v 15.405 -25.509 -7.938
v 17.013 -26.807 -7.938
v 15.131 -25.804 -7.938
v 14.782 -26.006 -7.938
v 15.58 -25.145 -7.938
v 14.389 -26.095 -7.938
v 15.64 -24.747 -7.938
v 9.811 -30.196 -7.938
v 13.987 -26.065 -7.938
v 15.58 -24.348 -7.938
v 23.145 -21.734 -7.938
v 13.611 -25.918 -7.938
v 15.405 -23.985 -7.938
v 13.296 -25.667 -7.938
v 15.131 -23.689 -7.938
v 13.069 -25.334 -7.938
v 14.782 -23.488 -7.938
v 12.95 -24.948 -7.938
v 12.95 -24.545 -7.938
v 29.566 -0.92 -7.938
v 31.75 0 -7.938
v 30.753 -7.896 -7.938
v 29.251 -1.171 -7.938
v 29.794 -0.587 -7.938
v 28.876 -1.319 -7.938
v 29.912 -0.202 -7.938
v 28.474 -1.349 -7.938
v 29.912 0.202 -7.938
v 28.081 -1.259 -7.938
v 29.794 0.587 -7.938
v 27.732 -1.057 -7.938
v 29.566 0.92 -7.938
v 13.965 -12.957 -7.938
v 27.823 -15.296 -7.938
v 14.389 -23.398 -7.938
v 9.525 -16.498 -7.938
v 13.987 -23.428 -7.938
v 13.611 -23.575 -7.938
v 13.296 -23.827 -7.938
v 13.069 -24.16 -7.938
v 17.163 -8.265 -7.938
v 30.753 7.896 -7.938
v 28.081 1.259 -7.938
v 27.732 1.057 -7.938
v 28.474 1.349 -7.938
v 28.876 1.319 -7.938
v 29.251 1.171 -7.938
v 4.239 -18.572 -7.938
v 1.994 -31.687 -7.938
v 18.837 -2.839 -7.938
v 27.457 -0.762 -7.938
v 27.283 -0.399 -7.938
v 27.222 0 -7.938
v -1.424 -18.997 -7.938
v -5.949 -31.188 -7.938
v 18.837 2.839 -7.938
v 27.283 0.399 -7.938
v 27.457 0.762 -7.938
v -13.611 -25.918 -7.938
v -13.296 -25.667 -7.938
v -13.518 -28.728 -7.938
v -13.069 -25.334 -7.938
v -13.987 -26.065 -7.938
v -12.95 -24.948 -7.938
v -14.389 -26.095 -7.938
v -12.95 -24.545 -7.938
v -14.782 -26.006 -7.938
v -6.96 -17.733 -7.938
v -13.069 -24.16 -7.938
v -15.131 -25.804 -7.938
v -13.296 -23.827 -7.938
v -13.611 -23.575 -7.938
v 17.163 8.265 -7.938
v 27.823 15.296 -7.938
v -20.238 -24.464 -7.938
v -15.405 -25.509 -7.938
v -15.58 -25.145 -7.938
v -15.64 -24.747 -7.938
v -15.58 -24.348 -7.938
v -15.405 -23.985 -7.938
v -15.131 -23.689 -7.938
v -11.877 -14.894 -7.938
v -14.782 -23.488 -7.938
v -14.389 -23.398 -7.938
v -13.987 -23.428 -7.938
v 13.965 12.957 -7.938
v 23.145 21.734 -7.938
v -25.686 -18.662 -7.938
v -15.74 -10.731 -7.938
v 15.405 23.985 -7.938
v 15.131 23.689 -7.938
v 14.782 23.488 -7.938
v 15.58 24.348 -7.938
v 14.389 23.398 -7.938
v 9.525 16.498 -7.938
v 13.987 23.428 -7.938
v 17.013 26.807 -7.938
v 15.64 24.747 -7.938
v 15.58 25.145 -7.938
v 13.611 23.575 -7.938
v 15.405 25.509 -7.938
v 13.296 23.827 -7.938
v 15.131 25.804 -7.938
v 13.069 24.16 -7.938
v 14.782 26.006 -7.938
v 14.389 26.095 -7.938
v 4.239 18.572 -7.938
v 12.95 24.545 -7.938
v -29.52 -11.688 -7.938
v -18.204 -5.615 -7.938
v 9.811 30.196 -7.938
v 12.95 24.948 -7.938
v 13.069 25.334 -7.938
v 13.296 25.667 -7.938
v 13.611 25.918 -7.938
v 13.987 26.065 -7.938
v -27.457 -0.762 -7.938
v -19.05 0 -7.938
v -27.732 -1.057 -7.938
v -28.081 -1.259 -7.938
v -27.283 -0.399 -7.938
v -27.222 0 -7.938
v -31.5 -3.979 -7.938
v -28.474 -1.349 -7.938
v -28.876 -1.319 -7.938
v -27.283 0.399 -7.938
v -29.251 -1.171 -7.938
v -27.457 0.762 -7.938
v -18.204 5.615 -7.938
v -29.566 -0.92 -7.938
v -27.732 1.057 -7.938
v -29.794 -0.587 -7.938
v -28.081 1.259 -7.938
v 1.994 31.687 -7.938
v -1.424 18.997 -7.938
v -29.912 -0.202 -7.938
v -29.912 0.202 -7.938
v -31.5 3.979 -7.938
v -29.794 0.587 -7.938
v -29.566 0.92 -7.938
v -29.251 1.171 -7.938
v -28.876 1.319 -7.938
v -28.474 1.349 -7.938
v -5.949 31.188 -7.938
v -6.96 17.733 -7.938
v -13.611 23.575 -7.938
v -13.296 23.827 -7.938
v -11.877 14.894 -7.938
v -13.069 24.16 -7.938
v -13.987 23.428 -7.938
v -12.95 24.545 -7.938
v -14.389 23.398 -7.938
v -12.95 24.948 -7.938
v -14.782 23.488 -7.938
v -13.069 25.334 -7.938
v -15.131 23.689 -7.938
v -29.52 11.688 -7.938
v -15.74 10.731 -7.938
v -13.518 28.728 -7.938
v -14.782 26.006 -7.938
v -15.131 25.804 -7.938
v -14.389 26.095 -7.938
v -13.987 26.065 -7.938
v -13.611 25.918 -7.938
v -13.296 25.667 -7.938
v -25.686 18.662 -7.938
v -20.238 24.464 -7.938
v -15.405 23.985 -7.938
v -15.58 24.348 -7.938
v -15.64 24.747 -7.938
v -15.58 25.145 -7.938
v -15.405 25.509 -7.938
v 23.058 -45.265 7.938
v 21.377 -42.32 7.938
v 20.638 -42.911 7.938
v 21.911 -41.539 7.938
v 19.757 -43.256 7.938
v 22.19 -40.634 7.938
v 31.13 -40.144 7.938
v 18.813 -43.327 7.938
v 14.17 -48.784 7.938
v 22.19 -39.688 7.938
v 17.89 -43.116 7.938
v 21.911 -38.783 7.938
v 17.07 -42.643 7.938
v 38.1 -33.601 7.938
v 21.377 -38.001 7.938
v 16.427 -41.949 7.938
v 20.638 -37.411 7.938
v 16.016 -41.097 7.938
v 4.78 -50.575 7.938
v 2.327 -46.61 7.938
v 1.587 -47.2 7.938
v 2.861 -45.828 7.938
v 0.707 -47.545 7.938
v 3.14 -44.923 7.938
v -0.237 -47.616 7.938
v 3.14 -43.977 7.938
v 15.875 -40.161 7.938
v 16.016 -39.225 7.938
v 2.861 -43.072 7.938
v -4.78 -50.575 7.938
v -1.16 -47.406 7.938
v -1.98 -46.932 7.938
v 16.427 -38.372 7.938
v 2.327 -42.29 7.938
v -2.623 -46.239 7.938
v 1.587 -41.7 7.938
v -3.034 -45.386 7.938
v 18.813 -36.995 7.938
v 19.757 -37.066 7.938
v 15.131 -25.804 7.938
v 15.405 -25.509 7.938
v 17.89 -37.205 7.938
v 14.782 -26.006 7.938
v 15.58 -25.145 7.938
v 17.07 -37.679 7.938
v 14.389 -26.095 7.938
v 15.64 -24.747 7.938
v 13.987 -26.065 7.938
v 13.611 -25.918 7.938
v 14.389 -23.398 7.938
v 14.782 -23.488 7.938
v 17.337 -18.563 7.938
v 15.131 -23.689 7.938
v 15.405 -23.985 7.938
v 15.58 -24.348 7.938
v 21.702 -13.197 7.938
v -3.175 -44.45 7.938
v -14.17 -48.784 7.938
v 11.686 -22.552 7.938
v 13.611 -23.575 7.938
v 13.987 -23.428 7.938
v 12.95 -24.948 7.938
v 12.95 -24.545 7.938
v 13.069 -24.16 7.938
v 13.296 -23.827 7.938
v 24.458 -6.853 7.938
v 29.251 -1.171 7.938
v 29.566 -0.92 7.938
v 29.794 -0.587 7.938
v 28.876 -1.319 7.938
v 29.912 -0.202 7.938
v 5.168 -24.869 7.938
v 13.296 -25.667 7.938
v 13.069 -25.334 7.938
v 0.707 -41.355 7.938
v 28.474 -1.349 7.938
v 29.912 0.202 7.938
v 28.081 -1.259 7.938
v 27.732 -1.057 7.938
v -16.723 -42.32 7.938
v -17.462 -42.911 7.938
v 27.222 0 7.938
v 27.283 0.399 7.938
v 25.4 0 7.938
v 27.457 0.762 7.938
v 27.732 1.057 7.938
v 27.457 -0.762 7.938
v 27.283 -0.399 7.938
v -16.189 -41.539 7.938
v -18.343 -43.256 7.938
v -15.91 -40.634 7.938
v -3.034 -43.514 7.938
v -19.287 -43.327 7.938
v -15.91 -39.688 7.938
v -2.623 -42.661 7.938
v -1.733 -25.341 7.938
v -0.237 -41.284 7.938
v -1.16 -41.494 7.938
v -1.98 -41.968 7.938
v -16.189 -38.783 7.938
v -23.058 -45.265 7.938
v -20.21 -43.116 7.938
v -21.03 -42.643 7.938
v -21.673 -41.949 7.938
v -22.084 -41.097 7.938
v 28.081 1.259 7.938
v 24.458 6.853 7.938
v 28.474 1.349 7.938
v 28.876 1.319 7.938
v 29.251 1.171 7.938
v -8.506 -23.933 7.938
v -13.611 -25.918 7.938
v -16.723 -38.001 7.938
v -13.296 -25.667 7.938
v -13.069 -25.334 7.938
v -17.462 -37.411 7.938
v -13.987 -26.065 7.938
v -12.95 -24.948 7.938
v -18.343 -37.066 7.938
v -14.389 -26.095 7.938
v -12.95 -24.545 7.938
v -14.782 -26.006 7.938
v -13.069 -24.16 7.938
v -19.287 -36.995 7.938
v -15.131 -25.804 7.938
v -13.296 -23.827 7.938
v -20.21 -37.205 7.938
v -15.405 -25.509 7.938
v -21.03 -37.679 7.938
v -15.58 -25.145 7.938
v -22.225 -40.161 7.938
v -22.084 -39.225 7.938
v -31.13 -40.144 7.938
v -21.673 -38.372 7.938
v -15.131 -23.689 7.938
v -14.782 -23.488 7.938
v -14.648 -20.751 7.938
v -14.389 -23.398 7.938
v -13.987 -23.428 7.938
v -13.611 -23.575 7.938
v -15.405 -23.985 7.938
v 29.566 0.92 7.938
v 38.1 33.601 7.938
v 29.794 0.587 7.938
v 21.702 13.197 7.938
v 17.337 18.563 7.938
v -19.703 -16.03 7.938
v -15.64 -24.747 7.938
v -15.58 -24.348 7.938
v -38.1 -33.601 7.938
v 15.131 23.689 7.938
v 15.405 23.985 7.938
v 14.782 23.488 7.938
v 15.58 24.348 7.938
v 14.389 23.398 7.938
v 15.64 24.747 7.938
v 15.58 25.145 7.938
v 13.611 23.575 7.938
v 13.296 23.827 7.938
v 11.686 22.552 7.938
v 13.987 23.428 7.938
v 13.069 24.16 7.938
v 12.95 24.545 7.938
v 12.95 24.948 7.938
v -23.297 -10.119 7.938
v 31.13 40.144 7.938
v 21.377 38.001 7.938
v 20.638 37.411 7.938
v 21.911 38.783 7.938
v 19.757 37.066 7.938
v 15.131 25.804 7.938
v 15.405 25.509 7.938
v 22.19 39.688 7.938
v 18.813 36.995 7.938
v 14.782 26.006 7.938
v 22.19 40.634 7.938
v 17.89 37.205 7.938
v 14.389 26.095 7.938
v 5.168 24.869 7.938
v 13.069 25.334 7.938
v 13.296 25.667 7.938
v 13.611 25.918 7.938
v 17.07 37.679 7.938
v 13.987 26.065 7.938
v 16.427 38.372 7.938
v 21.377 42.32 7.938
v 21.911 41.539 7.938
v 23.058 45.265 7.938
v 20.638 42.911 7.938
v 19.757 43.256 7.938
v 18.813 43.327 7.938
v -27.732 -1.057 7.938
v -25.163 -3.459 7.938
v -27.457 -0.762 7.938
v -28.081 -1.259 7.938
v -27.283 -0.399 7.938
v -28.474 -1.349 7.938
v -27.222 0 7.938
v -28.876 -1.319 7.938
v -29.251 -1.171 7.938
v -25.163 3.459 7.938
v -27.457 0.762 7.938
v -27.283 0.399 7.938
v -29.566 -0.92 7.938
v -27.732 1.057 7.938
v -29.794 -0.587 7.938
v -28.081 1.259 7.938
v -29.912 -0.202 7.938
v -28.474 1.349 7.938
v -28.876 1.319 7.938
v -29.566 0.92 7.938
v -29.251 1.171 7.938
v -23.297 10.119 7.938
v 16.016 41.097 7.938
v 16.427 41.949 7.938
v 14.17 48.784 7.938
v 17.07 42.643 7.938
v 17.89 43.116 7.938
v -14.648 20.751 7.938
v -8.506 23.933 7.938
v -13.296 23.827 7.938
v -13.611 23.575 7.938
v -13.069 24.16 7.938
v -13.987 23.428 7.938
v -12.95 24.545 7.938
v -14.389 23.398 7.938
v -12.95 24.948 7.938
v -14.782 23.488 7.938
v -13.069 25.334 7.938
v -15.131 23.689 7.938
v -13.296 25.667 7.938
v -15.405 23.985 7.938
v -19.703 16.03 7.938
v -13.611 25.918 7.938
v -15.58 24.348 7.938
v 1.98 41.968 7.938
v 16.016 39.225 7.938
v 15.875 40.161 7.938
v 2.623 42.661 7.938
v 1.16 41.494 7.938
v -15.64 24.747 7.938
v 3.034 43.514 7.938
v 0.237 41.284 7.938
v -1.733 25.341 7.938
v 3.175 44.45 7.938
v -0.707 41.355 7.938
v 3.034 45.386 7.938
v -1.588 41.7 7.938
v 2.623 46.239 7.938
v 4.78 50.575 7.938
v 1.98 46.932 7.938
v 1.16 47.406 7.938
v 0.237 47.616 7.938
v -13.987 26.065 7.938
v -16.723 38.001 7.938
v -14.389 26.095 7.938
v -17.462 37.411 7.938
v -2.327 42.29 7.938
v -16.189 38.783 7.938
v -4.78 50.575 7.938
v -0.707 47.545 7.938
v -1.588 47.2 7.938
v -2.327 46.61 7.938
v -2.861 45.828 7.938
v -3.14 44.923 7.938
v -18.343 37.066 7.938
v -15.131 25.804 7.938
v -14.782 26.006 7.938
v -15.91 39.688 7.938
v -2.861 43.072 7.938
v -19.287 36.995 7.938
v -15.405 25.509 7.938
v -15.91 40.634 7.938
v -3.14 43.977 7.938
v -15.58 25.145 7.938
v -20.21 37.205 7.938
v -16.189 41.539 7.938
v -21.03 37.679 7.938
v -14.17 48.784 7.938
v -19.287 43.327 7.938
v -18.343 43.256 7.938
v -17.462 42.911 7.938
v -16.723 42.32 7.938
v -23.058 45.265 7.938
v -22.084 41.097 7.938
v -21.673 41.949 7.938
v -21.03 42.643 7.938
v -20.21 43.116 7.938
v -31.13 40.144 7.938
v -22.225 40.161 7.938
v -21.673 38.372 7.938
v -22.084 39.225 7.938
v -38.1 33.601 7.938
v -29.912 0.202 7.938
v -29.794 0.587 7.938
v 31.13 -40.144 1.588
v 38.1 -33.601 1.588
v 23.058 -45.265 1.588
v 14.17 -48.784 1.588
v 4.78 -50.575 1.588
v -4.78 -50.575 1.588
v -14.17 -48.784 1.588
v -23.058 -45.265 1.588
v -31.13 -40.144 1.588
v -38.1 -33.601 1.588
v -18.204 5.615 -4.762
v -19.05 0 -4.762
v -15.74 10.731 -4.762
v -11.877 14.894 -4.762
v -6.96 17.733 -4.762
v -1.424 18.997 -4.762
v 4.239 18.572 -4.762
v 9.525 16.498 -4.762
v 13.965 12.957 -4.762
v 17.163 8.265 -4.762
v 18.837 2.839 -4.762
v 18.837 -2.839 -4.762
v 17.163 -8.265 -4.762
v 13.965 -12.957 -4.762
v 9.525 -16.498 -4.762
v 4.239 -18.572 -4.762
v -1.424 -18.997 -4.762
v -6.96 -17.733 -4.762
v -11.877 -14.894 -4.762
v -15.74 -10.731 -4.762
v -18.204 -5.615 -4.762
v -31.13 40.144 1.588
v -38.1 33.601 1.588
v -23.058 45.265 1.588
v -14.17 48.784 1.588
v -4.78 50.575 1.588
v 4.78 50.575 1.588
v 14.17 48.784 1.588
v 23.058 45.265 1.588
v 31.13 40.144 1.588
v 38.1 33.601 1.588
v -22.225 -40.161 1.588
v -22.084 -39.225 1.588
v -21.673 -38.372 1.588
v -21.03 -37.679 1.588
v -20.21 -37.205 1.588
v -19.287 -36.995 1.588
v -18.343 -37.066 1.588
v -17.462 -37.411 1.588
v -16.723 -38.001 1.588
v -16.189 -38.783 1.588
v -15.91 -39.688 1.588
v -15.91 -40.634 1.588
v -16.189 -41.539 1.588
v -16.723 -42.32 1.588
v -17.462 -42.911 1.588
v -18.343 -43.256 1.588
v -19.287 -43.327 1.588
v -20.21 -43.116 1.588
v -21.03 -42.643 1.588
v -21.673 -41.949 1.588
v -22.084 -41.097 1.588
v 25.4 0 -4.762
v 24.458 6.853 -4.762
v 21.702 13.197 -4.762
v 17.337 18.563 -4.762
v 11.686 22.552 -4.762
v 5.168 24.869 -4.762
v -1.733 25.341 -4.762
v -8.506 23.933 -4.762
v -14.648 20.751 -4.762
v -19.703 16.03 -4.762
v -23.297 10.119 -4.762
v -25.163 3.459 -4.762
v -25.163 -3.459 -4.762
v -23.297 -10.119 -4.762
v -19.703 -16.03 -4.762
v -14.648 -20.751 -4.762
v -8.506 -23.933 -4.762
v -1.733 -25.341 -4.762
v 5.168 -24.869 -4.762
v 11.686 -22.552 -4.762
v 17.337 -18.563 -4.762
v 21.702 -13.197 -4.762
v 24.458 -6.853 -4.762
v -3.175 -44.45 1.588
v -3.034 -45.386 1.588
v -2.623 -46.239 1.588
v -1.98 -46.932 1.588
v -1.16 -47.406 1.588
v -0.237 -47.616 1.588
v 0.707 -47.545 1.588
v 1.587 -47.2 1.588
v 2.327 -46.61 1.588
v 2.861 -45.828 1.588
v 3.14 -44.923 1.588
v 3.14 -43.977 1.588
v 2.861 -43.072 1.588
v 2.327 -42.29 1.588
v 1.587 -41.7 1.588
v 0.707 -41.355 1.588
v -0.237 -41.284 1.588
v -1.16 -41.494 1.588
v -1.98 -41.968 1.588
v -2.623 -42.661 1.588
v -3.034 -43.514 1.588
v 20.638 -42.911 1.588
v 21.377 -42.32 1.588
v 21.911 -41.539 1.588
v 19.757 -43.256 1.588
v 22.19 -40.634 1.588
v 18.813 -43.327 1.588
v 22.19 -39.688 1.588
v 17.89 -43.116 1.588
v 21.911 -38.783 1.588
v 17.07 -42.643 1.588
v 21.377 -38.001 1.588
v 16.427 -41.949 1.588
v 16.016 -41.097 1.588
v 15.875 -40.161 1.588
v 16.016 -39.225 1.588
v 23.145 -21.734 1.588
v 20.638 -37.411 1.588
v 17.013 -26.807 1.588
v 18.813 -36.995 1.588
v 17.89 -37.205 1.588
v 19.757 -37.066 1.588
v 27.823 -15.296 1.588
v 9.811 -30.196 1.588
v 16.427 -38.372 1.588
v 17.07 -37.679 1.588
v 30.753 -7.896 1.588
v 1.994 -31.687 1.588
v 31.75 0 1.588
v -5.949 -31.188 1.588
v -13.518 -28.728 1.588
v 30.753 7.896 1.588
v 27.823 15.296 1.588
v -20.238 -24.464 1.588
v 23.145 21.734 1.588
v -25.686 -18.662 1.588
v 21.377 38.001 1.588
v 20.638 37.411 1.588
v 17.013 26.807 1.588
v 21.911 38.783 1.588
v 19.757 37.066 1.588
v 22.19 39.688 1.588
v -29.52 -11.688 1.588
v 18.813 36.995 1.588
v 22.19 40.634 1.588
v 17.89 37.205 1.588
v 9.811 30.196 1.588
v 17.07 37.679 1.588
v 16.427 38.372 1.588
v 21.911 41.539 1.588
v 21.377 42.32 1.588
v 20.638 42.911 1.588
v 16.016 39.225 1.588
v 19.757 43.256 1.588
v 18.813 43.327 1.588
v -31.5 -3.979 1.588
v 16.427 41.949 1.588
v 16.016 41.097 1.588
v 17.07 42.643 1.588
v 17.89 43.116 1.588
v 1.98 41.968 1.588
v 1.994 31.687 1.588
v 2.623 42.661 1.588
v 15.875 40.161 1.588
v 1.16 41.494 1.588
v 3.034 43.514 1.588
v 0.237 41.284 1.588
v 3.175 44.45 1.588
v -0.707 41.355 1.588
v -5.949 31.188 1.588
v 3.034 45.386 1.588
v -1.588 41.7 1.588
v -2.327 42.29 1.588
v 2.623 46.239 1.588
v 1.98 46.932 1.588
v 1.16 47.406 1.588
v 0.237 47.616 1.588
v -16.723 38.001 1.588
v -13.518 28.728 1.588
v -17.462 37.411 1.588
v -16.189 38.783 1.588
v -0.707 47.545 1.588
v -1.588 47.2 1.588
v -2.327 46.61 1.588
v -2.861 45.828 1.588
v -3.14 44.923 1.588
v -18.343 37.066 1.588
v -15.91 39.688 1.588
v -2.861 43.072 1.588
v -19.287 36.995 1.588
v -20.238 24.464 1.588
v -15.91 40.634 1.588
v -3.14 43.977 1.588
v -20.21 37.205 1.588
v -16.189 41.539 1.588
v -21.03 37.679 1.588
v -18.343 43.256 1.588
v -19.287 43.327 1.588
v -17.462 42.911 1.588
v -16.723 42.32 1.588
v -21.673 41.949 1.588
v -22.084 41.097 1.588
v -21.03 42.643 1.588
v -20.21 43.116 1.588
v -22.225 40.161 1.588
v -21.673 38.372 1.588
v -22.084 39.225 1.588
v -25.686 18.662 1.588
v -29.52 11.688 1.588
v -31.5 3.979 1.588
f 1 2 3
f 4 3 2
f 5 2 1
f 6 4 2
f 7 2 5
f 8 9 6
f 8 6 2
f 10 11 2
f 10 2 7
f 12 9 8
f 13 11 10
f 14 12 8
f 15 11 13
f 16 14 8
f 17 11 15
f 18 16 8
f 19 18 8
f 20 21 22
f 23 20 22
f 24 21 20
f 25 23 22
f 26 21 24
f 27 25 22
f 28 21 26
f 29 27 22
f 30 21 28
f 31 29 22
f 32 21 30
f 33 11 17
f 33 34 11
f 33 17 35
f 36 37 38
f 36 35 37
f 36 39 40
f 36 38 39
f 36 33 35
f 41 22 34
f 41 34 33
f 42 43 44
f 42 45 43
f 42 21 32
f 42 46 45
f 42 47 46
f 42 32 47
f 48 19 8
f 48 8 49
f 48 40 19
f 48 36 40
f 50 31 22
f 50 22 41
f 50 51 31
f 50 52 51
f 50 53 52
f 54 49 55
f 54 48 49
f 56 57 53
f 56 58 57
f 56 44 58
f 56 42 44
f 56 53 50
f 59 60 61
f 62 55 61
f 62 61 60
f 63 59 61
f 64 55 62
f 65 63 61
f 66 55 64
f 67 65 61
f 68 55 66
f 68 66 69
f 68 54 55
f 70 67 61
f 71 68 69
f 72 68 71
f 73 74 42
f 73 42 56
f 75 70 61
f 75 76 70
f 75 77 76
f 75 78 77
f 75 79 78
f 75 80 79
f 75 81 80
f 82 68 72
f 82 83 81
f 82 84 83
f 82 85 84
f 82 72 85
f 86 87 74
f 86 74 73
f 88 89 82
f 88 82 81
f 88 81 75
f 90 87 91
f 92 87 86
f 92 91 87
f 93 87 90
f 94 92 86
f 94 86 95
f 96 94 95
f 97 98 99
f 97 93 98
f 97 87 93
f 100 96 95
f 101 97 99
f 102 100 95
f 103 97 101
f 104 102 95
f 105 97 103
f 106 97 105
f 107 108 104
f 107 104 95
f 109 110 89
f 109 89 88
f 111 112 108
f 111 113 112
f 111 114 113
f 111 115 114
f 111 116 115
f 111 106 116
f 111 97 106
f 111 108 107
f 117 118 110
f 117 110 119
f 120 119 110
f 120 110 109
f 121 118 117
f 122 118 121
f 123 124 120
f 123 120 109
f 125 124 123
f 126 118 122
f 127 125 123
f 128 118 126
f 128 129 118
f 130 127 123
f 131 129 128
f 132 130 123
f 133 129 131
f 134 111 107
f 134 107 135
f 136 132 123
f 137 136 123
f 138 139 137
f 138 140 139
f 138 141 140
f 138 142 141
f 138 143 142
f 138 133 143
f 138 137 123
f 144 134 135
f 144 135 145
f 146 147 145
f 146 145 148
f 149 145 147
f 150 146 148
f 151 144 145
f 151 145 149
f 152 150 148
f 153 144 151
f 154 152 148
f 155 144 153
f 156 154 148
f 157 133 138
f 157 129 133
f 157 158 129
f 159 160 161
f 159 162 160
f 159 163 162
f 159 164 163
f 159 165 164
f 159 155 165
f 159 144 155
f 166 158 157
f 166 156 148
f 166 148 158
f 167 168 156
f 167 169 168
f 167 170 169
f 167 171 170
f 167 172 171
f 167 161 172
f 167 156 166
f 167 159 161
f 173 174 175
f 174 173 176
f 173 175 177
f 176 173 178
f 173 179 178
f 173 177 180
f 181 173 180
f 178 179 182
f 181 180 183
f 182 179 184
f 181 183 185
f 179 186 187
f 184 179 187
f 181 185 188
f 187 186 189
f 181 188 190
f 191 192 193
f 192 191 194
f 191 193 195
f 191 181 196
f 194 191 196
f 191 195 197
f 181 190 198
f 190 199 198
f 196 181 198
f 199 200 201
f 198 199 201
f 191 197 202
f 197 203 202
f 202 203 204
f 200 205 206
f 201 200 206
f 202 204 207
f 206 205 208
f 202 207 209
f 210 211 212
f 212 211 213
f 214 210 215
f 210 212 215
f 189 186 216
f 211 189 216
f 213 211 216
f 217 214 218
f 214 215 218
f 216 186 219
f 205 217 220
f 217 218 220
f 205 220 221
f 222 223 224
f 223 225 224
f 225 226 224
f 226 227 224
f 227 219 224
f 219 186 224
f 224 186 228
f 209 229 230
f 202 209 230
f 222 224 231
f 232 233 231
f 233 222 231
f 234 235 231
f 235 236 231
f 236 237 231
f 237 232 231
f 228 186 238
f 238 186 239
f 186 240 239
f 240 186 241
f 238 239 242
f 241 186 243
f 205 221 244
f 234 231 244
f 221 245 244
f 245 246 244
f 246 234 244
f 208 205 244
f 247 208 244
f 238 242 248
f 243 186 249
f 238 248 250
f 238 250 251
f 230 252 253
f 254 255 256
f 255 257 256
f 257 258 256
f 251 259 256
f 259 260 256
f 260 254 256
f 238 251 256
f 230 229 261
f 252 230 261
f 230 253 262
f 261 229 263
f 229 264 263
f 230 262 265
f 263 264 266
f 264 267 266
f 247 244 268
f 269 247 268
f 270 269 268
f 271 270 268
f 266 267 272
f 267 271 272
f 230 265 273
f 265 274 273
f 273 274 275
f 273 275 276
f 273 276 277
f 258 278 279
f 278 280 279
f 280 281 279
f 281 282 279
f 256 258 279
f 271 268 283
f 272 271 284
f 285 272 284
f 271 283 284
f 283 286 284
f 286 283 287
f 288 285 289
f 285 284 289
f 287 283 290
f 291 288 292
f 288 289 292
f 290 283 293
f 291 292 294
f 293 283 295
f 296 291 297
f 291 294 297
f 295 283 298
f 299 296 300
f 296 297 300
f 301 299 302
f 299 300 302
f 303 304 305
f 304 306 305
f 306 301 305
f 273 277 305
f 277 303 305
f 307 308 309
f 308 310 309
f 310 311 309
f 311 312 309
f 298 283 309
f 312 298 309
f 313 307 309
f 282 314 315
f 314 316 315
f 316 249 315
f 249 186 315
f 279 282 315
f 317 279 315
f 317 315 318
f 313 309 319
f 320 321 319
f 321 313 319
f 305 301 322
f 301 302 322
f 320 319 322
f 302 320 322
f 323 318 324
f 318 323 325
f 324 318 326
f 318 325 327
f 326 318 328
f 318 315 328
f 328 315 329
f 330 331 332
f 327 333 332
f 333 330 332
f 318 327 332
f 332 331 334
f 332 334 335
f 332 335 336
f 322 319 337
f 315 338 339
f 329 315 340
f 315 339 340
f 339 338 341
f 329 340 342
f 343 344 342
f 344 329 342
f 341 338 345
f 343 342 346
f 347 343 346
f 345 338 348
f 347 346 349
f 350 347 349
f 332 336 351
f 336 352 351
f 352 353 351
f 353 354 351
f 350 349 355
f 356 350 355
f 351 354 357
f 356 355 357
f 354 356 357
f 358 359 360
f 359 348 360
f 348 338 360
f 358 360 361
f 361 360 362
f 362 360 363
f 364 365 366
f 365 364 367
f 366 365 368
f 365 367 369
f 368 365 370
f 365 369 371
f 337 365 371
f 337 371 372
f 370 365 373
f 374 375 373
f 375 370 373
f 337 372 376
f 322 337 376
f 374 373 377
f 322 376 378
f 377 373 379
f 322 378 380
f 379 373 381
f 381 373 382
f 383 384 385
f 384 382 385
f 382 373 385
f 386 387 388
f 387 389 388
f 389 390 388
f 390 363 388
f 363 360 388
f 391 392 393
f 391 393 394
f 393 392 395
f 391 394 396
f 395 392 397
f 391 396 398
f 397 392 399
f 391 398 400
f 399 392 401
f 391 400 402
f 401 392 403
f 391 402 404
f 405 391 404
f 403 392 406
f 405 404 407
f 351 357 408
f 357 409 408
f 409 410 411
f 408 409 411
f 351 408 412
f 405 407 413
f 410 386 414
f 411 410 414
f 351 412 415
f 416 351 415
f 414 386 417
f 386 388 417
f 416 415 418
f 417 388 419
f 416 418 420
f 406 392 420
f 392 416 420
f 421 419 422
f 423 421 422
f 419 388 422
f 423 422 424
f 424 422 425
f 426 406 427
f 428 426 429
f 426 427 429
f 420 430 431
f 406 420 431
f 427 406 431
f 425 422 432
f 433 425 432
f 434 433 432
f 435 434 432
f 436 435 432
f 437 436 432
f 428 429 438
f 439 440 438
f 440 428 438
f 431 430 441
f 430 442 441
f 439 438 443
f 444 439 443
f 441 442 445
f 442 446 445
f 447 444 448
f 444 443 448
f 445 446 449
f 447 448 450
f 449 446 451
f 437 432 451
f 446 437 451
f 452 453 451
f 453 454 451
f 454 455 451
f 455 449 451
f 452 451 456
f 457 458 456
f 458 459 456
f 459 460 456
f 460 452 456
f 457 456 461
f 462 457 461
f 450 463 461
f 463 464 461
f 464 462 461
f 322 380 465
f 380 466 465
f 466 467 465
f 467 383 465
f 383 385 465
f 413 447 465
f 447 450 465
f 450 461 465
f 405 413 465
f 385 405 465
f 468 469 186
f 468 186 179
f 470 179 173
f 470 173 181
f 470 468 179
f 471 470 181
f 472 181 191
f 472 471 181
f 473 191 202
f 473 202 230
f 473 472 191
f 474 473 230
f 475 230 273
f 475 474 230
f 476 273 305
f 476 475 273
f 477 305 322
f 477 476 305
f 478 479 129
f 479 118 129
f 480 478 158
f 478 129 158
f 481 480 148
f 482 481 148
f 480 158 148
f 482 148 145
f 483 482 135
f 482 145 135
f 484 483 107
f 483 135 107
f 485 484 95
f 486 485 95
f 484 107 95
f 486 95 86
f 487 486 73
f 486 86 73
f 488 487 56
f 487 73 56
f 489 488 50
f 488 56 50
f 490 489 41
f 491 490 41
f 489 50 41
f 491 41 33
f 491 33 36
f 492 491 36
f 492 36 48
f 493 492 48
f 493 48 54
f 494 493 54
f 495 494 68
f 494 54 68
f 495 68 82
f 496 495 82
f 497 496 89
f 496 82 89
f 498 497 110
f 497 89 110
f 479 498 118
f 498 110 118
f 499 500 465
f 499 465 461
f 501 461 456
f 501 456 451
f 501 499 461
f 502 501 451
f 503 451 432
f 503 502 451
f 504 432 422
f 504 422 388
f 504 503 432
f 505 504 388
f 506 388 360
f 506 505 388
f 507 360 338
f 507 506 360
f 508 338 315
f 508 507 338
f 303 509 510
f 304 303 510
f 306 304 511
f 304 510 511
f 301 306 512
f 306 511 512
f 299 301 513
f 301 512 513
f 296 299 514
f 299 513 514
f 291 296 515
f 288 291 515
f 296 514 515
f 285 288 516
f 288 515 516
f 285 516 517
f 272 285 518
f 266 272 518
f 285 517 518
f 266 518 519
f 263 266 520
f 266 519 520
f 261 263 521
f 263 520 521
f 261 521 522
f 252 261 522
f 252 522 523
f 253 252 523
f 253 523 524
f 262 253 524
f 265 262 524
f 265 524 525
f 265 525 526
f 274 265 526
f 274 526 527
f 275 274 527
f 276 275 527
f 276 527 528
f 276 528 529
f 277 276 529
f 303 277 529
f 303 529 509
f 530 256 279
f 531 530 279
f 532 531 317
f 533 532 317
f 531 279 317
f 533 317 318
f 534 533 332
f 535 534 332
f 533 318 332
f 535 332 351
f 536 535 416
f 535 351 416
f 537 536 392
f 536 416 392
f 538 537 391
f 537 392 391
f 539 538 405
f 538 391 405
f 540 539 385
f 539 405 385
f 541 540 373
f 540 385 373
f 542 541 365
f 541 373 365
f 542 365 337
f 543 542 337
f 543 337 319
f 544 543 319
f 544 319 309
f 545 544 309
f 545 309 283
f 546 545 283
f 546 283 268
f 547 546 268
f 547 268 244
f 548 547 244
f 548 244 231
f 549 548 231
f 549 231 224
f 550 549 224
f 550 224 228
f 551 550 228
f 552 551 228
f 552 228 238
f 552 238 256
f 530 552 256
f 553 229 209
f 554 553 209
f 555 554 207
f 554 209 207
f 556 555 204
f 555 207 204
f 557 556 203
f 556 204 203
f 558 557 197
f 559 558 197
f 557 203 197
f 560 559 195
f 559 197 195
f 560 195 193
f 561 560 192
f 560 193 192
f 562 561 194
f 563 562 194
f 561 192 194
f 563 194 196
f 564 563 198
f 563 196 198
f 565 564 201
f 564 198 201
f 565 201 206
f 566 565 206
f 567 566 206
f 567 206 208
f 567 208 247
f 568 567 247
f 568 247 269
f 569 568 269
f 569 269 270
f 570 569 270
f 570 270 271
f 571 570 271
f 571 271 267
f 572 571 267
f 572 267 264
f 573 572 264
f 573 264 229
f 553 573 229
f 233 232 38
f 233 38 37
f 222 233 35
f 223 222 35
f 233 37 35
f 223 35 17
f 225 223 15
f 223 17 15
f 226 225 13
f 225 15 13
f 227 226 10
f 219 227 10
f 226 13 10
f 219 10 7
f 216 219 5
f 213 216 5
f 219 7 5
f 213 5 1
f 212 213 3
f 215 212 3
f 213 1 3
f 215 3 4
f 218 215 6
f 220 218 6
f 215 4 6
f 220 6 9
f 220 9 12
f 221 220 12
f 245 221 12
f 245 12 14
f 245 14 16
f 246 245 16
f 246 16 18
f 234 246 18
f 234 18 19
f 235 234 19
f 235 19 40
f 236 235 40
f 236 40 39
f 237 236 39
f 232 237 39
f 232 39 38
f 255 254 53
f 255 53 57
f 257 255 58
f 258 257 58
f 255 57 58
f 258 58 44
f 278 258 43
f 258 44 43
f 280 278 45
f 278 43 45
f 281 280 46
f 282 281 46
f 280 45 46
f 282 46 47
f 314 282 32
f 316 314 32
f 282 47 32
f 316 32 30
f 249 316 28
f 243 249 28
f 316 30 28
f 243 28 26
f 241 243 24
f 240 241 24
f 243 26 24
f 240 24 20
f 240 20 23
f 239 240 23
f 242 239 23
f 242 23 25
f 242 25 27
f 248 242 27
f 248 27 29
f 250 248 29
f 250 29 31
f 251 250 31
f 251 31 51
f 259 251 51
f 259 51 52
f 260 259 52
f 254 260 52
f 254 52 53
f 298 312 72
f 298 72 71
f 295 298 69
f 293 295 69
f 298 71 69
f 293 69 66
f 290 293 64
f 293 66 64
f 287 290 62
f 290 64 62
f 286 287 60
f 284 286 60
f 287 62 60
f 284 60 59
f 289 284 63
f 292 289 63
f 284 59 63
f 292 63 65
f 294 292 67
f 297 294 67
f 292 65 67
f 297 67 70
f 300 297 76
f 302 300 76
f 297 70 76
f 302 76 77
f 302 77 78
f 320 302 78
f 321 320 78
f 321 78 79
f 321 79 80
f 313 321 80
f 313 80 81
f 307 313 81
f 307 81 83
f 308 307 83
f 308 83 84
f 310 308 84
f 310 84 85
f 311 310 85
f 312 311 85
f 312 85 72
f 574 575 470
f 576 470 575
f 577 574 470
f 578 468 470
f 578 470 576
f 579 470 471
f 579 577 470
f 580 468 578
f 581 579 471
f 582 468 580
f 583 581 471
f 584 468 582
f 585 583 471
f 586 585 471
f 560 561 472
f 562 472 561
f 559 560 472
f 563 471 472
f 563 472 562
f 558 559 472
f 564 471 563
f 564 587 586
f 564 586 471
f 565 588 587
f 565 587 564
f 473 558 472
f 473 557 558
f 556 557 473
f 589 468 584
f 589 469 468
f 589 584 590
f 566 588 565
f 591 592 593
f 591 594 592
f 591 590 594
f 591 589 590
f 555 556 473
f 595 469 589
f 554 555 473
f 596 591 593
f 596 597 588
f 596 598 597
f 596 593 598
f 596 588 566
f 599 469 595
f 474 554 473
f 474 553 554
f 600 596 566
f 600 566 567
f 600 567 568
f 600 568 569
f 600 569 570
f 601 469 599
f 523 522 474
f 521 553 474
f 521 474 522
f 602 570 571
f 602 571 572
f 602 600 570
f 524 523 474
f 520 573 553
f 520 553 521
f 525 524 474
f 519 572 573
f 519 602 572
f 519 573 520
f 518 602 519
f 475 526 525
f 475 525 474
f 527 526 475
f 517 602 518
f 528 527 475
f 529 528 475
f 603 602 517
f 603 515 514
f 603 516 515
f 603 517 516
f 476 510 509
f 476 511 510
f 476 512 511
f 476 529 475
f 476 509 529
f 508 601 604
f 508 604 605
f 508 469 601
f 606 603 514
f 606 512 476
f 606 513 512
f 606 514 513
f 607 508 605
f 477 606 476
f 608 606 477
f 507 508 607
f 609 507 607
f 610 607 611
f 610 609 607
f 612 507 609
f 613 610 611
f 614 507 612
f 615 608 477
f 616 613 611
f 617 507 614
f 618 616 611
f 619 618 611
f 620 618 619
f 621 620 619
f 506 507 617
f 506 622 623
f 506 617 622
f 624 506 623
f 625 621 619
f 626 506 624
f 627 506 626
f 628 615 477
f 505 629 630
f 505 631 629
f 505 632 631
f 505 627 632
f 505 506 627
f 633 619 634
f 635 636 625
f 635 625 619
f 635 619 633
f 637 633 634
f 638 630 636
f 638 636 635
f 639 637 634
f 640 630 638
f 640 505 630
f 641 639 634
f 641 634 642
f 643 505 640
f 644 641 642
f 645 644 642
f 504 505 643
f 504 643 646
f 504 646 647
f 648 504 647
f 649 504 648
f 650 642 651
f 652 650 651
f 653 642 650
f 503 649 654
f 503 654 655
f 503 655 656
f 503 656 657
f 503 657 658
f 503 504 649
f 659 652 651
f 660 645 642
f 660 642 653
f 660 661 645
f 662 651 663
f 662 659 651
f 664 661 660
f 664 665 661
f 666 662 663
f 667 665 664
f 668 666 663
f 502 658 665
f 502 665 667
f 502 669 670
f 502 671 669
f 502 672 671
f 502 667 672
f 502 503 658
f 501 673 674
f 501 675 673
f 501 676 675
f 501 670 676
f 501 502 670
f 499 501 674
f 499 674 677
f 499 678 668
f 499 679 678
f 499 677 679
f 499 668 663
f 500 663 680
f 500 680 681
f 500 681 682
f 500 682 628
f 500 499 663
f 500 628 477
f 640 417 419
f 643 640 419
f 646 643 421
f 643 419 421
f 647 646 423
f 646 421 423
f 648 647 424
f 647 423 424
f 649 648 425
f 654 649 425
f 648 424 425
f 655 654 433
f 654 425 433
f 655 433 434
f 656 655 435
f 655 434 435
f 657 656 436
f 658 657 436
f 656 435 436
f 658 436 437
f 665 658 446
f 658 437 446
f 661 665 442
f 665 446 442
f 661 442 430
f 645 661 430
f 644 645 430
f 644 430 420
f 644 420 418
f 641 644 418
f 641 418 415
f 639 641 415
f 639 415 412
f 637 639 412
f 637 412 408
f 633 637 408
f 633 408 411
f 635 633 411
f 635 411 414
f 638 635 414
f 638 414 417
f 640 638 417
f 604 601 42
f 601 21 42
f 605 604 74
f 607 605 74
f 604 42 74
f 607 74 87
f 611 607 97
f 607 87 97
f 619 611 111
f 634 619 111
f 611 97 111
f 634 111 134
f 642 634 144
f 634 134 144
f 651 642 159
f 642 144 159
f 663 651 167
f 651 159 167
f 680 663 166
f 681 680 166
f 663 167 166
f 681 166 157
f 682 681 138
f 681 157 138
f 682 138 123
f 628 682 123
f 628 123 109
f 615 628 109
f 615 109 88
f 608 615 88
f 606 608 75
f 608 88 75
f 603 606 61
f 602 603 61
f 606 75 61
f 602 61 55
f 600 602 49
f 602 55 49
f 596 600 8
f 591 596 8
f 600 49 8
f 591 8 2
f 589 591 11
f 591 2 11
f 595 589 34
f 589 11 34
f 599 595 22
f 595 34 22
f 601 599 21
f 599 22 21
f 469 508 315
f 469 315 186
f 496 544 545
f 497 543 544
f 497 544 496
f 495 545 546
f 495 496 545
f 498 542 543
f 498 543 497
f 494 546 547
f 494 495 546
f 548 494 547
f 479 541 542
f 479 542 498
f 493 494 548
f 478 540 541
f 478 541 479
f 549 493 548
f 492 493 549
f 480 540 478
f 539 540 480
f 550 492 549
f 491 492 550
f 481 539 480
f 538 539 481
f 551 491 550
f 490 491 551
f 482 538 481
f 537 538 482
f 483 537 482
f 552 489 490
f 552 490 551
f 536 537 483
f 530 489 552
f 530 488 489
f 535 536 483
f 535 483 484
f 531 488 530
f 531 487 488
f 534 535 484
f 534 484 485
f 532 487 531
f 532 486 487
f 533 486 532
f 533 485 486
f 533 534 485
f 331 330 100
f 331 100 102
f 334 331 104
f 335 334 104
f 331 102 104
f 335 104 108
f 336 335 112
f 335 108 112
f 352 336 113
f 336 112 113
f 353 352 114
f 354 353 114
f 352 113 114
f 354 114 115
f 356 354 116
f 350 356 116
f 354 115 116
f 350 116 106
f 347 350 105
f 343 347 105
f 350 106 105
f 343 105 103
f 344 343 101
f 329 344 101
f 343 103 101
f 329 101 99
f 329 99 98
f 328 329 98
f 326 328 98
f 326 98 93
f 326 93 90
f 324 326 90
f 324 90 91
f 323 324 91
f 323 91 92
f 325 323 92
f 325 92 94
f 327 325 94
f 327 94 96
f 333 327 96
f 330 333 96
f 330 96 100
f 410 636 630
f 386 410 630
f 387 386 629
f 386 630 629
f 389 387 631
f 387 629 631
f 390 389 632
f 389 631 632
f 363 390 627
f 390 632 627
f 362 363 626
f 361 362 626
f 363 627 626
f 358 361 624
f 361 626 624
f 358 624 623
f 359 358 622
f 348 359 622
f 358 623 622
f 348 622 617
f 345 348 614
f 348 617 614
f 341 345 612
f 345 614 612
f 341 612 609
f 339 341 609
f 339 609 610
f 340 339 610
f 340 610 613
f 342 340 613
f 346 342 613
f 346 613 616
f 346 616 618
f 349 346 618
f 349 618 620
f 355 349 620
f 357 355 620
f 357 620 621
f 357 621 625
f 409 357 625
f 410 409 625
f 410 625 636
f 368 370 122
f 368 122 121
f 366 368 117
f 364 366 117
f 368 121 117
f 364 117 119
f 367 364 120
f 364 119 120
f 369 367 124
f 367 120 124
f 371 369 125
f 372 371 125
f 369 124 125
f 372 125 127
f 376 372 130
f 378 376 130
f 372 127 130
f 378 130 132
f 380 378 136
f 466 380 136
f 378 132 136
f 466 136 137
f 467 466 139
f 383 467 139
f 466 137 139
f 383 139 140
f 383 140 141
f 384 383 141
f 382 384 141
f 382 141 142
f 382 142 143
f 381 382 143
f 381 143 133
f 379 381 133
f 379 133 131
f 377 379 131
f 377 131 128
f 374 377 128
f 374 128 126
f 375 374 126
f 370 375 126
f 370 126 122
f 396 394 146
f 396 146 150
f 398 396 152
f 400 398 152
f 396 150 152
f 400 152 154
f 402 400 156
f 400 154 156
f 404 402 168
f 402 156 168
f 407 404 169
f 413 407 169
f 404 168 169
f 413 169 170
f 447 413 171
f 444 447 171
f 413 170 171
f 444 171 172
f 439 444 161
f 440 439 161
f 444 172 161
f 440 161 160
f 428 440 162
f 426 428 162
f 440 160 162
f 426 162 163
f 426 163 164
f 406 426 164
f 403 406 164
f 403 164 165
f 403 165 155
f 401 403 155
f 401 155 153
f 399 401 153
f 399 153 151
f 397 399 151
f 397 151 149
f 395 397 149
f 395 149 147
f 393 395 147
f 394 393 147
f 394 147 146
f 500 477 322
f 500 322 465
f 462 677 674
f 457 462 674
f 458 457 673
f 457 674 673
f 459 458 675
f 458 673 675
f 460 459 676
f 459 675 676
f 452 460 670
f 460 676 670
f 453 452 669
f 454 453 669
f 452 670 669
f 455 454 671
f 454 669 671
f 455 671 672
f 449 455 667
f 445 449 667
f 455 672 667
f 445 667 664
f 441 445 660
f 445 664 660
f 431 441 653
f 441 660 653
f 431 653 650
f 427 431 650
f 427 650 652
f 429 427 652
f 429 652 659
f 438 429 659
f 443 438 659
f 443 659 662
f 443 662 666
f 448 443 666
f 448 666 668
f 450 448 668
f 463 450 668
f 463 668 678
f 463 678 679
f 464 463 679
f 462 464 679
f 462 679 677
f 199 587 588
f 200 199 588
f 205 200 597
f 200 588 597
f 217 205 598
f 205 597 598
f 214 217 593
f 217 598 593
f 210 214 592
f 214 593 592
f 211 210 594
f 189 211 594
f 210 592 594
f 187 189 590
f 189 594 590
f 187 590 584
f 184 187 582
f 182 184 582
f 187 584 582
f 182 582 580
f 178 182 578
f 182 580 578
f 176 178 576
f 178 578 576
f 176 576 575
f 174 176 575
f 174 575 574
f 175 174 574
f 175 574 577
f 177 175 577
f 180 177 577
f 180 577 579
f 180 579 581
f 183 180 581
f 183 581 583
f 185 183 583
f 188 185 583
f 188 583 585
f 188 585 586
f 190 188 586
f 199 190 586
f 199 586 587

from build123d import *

# Parameters (mm, degrees)
BOSS_EXTRUDE1_DEPTH              = 6.35
SKETCH2_W                        = 31.75
SKETCH2_H                        = 9.525
F_2_4_5_TAPPED_HOLE1_D           = 38.1
F_2_4_5_TAPPED_HOLE1_CBORE_D     = 50.8
F_2_4_5_TAPPED_HOLE1_CBORE_DEPTH = 12.7
SKETCH13_R                       = 3.175
CUT_EXTRUDE1_DEPTH               = 66.454301807
CIRPATTERN1_COUNT                = 2
F_6_32_TAPPED_HOLE1_D            = 2.7051
CIRPATTERN2_COUNT                = 6
F_1_4_0_25_DIAMETER_HOLE1_D      = 6.35
F_1_4_0_25_DIAMETER_HOLE2_D      = 6.35


with BuildPart() as part:
    # Sketch1 → Boss-Extrude1 (new body)
    with BuildSketch(Plane(origin=(0, 0, 1.5875), x_dir=(-1, 0, 0), z_dir=(0, 0, -1))):
        with BuildLine():
            Line((38.1, -33.601041651), (38.1, 33.601041651))
            ThreePointArc((38.1, 33.601041651), (0, 50.8), (-38.1, 33.601041651))
            Line((-38.1, 33.601041651), (-38.1, -33.601041651))
            ThreePointArc((-38.1, -33.601041651), (0, -50.8), (38.1, -33.601041651))
        make_face()
    extrude(amount=-BOSS_EXTRUDE1_DEPTH)

    # Sketch2 → Revolve1 (revolve)
    with BuildSketch(Plane(origin=(0, 0, 0), x_dir=(1, 0, 0), z_dir=(0, 1, 0))):
        with Locations((15.875, 3.175)):
            Rectangle(SKETCH2_W, SKETCH2_H)
    revolve(axis=Axis((0, 0, -7.9375), (0, 0, 1)))

    # 2-4.5 Tapped Hole1 (through all)
    with Locations(Plane.XY.offset(7.9375)):
        with Locations((0, 0)):
            CounterBoreHole(F_2_4_5_TAPPED_HOLE1_D / 2, F_2_4_5_TAPPED_HOLE1_CBORE_D / 2, F_2_4_5_TAPPED_HOLE1_CBORE_DEPTH)

    # Sketch13 → Cut-Extrude1 (cut, through all)
    with BuildSketch(Plane.XY.offset(7.9375)):
        with Locations((0, 44.45)):
            Circle(SKETCH13_R)
    cut_extrude1 = extrude(amount=-CUT_EXTRUDE1_DEPTH, mode=Mode.SUBTRACT)

    # CirPattern1: Cut-Extrude1 ×2 about axis
    cirpattern1_axis = Axis((0, 0, 0), (0, 0, 1))
    for i in range(1, CIRPATTERN1_COUNT):
        add(cut_extrude1.rotate(cirpattern1_axis, i * 360 / CIRPATTERN1_COUNT), mode=Mode.SUBTRACT)

    # #6-32 Tapped Hole1 (through all)
    with Locations(Plane.XY.offset(7.9375)):
        with Locations((28.575, 0)):
            f_6_32_tapped_hole1 = Hole(F_6_32_TAPPED_HOLE1_D / 2)

    # CirPattern2: #6-32 Tapped Hole1 ×6 about axis
    cirpattern2_axis = Axis((0, 0, 0), (0, 0, 1))
    for i in range(1, CIRPATTERN2_COUNT):
        add(f_6_32_tapped_hole1.rotate(cirpattern2_axis, i * 360 / CIRPATTERN2_COUNT), mode=Mode.SUBTRACT)

    # 1/4 (0.25) Diameter Hole1 (through all)
    with Locations(Plane.XY.offset(7.9375)):
        with Locations((-19.05, 40.160926284)):
            Hole(F_1_4_0_25_DIAMETER_HOLE1_D / 2)

    # 1/4 (0.25) Diameter Hole2 (through all)
    with Locations(Plane.XY.offset(7.9375)):
        with Locations((19.05, 40.160926284), (19.05, -40.160926284), (-19.05, -40.160926284)):
            Hole(F_1_4_0_25_DIAMETER_HOLE2_D / 2)


solid = part.part
